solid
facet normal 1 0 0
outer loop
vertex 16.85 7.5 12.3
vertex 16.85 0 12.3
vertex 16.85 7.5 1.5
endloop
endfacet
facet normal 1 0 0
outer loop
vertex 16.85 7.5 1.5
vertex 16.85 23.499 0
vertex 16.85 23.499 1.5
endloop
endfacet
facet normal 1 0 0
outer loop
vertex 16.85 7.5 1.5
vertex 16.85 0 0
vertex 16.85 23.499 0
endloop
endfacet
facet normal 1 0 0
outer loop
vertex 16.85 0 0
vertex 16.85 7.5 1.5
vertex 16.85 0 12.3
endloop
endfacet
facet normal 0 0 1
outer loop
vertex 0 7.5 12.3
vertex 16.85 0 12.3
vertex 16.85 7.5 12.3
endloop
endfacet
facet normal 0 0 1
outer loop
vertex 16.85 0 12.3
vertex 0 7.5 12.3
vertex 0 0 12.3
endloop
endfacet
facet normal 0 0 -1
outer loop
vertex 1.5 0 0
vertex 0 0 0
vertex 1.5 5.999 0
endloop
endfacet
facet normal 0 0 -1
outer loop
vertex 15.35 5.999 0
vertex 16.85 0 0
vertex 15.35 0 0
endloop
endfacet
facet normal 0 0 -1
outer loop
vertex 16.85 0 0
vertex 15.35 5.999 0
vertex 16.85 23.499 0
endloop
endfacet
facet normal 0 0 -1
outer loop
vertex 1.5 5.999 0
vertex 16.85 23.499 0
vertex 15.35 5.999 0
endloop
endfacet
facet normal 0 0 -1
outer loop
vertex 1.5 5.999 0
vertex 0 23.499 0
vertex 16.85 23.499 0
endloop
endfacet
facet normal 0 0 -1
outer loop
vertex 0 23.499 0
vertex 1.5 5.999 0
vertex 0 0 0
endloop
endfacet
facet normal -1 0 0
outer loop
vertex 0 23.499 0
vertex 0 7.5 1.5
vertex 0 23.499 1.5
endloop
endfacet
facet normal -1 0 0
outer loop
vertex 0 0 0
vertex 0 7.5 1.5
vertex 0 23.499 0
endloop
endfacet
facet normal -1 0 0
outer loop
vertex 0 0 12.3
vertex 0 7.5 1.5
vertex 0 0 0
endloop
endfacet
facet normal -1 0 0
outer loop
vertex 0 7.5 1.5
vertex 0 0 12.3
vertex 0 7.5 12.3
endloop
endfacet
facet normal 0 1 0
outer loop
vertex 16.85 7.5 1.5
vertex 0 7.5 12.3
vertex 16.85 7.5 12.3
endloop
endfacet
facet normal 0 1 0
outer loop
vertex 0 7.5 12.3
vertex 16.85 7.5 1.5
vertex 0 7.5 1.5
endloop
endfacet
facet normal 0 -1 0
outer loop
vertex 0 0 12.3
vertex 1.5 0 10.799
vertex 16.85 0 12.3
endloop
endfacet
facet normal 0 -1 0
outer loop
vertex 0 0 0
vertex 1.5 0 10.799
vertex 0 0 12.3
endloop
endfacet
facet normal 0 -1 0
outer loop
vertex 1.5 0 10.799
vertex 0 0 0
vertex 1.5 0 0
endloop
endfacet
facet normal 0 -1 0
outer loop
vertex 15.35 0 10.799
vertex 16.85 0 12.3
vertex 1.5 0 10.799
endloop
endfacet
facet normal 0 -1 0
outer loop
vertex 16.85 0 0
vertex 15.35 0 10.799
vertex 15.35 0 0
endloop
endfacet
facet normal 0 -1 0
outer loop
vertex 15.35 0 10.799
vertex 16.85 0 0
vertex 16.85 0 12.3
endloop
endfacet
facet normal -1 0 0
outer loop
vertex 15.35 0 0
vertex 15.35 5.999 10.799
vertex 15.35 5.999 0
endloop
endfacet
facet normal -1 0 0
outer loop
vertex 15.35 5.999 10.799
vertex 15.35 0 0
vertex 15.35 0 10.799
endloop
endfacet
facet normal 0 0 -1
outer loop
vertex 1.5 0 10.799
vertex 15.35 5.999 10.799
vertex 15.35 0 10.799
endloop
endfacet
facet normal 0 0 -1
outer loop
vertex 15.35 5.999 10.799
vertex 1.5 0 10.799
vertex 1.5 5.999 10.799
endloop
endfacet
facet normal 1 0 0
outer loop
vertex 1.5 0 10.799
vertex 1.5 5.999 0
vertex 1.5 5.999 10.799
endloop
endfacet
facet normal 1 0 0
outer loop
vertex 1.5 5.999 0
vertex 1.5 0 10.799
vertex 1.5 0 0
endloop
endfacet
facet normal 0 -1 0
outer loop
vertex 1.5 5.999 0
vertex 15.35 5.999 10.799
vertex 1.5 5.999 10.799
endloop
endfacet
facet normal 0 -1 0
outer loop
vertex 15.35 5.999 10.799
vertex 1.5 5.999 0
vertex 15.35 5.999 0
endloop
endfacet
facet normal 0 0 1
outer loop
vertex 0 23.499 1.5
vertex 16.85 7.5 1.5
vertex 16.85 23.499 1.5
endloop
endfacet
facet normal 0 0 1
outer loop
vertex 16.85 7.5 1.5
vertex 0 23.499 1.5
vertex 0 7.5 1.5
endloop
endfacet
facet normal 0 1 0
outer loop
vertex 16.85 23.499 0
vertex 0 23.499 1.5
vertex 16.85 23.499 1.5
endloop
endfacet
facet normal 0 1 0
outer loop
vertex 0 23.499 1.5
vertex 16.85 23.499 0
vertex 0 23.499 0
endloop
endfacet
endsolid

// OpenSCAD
echo(version=version());


w1 = 9.0;
w2 = 11.8;

wall = 3;
divider = 2.1;
h = 18.38 + 2*wall+divider;

d = 18;


module example_intersection()
{
    
union() {
	/*intersection() {
		difference() {
			union() {
				cube([30, 30, 30], center = true);
				translate([0, 0, -25])
					cube([15, 15, 50], center = true);
			}
			union() {
				cube([50, 10, 10], center = true);
				cube([10, 50, 10], center = true);
				cube([10, 10, 50], center = true);
			}
		}
		translate([0, 0, 5])
			cylinder(h = 50, r1 = 20, r2 = 5, center = true);
	}*/
    
    w = 13.85;
    hold = 16;
    h = 10.8;
    half = 6;
    wall = 1.5;
    eps = 0.001;
    difference() {
        
    cube([w + wall + wall, half + wall, h + wall]);
       
       translate([wall, -eps, -eps]) 
    cube([w, half, h]);
    }
    
       translate([0, half + wall - eps, 0]) 
    cube([w + 2 * wall, hold, wall]);
    
    /*rotate([90])
		difference() {
				translate([0, 0, h/2])
					cube([w2 + 2*wall, d, h], center = true);
				translate([0, 0, (h - wall * 2 - divider) / 2])
					cube([w1, d * 1.001, h * 1.001 - wall * 2 - divider], center = true);
				translate([0, 0, h - divider / 2 - wall])
					cube([w2 , d * 1.001, divider], center = true);
		}*/
}
}

example_intersection();
